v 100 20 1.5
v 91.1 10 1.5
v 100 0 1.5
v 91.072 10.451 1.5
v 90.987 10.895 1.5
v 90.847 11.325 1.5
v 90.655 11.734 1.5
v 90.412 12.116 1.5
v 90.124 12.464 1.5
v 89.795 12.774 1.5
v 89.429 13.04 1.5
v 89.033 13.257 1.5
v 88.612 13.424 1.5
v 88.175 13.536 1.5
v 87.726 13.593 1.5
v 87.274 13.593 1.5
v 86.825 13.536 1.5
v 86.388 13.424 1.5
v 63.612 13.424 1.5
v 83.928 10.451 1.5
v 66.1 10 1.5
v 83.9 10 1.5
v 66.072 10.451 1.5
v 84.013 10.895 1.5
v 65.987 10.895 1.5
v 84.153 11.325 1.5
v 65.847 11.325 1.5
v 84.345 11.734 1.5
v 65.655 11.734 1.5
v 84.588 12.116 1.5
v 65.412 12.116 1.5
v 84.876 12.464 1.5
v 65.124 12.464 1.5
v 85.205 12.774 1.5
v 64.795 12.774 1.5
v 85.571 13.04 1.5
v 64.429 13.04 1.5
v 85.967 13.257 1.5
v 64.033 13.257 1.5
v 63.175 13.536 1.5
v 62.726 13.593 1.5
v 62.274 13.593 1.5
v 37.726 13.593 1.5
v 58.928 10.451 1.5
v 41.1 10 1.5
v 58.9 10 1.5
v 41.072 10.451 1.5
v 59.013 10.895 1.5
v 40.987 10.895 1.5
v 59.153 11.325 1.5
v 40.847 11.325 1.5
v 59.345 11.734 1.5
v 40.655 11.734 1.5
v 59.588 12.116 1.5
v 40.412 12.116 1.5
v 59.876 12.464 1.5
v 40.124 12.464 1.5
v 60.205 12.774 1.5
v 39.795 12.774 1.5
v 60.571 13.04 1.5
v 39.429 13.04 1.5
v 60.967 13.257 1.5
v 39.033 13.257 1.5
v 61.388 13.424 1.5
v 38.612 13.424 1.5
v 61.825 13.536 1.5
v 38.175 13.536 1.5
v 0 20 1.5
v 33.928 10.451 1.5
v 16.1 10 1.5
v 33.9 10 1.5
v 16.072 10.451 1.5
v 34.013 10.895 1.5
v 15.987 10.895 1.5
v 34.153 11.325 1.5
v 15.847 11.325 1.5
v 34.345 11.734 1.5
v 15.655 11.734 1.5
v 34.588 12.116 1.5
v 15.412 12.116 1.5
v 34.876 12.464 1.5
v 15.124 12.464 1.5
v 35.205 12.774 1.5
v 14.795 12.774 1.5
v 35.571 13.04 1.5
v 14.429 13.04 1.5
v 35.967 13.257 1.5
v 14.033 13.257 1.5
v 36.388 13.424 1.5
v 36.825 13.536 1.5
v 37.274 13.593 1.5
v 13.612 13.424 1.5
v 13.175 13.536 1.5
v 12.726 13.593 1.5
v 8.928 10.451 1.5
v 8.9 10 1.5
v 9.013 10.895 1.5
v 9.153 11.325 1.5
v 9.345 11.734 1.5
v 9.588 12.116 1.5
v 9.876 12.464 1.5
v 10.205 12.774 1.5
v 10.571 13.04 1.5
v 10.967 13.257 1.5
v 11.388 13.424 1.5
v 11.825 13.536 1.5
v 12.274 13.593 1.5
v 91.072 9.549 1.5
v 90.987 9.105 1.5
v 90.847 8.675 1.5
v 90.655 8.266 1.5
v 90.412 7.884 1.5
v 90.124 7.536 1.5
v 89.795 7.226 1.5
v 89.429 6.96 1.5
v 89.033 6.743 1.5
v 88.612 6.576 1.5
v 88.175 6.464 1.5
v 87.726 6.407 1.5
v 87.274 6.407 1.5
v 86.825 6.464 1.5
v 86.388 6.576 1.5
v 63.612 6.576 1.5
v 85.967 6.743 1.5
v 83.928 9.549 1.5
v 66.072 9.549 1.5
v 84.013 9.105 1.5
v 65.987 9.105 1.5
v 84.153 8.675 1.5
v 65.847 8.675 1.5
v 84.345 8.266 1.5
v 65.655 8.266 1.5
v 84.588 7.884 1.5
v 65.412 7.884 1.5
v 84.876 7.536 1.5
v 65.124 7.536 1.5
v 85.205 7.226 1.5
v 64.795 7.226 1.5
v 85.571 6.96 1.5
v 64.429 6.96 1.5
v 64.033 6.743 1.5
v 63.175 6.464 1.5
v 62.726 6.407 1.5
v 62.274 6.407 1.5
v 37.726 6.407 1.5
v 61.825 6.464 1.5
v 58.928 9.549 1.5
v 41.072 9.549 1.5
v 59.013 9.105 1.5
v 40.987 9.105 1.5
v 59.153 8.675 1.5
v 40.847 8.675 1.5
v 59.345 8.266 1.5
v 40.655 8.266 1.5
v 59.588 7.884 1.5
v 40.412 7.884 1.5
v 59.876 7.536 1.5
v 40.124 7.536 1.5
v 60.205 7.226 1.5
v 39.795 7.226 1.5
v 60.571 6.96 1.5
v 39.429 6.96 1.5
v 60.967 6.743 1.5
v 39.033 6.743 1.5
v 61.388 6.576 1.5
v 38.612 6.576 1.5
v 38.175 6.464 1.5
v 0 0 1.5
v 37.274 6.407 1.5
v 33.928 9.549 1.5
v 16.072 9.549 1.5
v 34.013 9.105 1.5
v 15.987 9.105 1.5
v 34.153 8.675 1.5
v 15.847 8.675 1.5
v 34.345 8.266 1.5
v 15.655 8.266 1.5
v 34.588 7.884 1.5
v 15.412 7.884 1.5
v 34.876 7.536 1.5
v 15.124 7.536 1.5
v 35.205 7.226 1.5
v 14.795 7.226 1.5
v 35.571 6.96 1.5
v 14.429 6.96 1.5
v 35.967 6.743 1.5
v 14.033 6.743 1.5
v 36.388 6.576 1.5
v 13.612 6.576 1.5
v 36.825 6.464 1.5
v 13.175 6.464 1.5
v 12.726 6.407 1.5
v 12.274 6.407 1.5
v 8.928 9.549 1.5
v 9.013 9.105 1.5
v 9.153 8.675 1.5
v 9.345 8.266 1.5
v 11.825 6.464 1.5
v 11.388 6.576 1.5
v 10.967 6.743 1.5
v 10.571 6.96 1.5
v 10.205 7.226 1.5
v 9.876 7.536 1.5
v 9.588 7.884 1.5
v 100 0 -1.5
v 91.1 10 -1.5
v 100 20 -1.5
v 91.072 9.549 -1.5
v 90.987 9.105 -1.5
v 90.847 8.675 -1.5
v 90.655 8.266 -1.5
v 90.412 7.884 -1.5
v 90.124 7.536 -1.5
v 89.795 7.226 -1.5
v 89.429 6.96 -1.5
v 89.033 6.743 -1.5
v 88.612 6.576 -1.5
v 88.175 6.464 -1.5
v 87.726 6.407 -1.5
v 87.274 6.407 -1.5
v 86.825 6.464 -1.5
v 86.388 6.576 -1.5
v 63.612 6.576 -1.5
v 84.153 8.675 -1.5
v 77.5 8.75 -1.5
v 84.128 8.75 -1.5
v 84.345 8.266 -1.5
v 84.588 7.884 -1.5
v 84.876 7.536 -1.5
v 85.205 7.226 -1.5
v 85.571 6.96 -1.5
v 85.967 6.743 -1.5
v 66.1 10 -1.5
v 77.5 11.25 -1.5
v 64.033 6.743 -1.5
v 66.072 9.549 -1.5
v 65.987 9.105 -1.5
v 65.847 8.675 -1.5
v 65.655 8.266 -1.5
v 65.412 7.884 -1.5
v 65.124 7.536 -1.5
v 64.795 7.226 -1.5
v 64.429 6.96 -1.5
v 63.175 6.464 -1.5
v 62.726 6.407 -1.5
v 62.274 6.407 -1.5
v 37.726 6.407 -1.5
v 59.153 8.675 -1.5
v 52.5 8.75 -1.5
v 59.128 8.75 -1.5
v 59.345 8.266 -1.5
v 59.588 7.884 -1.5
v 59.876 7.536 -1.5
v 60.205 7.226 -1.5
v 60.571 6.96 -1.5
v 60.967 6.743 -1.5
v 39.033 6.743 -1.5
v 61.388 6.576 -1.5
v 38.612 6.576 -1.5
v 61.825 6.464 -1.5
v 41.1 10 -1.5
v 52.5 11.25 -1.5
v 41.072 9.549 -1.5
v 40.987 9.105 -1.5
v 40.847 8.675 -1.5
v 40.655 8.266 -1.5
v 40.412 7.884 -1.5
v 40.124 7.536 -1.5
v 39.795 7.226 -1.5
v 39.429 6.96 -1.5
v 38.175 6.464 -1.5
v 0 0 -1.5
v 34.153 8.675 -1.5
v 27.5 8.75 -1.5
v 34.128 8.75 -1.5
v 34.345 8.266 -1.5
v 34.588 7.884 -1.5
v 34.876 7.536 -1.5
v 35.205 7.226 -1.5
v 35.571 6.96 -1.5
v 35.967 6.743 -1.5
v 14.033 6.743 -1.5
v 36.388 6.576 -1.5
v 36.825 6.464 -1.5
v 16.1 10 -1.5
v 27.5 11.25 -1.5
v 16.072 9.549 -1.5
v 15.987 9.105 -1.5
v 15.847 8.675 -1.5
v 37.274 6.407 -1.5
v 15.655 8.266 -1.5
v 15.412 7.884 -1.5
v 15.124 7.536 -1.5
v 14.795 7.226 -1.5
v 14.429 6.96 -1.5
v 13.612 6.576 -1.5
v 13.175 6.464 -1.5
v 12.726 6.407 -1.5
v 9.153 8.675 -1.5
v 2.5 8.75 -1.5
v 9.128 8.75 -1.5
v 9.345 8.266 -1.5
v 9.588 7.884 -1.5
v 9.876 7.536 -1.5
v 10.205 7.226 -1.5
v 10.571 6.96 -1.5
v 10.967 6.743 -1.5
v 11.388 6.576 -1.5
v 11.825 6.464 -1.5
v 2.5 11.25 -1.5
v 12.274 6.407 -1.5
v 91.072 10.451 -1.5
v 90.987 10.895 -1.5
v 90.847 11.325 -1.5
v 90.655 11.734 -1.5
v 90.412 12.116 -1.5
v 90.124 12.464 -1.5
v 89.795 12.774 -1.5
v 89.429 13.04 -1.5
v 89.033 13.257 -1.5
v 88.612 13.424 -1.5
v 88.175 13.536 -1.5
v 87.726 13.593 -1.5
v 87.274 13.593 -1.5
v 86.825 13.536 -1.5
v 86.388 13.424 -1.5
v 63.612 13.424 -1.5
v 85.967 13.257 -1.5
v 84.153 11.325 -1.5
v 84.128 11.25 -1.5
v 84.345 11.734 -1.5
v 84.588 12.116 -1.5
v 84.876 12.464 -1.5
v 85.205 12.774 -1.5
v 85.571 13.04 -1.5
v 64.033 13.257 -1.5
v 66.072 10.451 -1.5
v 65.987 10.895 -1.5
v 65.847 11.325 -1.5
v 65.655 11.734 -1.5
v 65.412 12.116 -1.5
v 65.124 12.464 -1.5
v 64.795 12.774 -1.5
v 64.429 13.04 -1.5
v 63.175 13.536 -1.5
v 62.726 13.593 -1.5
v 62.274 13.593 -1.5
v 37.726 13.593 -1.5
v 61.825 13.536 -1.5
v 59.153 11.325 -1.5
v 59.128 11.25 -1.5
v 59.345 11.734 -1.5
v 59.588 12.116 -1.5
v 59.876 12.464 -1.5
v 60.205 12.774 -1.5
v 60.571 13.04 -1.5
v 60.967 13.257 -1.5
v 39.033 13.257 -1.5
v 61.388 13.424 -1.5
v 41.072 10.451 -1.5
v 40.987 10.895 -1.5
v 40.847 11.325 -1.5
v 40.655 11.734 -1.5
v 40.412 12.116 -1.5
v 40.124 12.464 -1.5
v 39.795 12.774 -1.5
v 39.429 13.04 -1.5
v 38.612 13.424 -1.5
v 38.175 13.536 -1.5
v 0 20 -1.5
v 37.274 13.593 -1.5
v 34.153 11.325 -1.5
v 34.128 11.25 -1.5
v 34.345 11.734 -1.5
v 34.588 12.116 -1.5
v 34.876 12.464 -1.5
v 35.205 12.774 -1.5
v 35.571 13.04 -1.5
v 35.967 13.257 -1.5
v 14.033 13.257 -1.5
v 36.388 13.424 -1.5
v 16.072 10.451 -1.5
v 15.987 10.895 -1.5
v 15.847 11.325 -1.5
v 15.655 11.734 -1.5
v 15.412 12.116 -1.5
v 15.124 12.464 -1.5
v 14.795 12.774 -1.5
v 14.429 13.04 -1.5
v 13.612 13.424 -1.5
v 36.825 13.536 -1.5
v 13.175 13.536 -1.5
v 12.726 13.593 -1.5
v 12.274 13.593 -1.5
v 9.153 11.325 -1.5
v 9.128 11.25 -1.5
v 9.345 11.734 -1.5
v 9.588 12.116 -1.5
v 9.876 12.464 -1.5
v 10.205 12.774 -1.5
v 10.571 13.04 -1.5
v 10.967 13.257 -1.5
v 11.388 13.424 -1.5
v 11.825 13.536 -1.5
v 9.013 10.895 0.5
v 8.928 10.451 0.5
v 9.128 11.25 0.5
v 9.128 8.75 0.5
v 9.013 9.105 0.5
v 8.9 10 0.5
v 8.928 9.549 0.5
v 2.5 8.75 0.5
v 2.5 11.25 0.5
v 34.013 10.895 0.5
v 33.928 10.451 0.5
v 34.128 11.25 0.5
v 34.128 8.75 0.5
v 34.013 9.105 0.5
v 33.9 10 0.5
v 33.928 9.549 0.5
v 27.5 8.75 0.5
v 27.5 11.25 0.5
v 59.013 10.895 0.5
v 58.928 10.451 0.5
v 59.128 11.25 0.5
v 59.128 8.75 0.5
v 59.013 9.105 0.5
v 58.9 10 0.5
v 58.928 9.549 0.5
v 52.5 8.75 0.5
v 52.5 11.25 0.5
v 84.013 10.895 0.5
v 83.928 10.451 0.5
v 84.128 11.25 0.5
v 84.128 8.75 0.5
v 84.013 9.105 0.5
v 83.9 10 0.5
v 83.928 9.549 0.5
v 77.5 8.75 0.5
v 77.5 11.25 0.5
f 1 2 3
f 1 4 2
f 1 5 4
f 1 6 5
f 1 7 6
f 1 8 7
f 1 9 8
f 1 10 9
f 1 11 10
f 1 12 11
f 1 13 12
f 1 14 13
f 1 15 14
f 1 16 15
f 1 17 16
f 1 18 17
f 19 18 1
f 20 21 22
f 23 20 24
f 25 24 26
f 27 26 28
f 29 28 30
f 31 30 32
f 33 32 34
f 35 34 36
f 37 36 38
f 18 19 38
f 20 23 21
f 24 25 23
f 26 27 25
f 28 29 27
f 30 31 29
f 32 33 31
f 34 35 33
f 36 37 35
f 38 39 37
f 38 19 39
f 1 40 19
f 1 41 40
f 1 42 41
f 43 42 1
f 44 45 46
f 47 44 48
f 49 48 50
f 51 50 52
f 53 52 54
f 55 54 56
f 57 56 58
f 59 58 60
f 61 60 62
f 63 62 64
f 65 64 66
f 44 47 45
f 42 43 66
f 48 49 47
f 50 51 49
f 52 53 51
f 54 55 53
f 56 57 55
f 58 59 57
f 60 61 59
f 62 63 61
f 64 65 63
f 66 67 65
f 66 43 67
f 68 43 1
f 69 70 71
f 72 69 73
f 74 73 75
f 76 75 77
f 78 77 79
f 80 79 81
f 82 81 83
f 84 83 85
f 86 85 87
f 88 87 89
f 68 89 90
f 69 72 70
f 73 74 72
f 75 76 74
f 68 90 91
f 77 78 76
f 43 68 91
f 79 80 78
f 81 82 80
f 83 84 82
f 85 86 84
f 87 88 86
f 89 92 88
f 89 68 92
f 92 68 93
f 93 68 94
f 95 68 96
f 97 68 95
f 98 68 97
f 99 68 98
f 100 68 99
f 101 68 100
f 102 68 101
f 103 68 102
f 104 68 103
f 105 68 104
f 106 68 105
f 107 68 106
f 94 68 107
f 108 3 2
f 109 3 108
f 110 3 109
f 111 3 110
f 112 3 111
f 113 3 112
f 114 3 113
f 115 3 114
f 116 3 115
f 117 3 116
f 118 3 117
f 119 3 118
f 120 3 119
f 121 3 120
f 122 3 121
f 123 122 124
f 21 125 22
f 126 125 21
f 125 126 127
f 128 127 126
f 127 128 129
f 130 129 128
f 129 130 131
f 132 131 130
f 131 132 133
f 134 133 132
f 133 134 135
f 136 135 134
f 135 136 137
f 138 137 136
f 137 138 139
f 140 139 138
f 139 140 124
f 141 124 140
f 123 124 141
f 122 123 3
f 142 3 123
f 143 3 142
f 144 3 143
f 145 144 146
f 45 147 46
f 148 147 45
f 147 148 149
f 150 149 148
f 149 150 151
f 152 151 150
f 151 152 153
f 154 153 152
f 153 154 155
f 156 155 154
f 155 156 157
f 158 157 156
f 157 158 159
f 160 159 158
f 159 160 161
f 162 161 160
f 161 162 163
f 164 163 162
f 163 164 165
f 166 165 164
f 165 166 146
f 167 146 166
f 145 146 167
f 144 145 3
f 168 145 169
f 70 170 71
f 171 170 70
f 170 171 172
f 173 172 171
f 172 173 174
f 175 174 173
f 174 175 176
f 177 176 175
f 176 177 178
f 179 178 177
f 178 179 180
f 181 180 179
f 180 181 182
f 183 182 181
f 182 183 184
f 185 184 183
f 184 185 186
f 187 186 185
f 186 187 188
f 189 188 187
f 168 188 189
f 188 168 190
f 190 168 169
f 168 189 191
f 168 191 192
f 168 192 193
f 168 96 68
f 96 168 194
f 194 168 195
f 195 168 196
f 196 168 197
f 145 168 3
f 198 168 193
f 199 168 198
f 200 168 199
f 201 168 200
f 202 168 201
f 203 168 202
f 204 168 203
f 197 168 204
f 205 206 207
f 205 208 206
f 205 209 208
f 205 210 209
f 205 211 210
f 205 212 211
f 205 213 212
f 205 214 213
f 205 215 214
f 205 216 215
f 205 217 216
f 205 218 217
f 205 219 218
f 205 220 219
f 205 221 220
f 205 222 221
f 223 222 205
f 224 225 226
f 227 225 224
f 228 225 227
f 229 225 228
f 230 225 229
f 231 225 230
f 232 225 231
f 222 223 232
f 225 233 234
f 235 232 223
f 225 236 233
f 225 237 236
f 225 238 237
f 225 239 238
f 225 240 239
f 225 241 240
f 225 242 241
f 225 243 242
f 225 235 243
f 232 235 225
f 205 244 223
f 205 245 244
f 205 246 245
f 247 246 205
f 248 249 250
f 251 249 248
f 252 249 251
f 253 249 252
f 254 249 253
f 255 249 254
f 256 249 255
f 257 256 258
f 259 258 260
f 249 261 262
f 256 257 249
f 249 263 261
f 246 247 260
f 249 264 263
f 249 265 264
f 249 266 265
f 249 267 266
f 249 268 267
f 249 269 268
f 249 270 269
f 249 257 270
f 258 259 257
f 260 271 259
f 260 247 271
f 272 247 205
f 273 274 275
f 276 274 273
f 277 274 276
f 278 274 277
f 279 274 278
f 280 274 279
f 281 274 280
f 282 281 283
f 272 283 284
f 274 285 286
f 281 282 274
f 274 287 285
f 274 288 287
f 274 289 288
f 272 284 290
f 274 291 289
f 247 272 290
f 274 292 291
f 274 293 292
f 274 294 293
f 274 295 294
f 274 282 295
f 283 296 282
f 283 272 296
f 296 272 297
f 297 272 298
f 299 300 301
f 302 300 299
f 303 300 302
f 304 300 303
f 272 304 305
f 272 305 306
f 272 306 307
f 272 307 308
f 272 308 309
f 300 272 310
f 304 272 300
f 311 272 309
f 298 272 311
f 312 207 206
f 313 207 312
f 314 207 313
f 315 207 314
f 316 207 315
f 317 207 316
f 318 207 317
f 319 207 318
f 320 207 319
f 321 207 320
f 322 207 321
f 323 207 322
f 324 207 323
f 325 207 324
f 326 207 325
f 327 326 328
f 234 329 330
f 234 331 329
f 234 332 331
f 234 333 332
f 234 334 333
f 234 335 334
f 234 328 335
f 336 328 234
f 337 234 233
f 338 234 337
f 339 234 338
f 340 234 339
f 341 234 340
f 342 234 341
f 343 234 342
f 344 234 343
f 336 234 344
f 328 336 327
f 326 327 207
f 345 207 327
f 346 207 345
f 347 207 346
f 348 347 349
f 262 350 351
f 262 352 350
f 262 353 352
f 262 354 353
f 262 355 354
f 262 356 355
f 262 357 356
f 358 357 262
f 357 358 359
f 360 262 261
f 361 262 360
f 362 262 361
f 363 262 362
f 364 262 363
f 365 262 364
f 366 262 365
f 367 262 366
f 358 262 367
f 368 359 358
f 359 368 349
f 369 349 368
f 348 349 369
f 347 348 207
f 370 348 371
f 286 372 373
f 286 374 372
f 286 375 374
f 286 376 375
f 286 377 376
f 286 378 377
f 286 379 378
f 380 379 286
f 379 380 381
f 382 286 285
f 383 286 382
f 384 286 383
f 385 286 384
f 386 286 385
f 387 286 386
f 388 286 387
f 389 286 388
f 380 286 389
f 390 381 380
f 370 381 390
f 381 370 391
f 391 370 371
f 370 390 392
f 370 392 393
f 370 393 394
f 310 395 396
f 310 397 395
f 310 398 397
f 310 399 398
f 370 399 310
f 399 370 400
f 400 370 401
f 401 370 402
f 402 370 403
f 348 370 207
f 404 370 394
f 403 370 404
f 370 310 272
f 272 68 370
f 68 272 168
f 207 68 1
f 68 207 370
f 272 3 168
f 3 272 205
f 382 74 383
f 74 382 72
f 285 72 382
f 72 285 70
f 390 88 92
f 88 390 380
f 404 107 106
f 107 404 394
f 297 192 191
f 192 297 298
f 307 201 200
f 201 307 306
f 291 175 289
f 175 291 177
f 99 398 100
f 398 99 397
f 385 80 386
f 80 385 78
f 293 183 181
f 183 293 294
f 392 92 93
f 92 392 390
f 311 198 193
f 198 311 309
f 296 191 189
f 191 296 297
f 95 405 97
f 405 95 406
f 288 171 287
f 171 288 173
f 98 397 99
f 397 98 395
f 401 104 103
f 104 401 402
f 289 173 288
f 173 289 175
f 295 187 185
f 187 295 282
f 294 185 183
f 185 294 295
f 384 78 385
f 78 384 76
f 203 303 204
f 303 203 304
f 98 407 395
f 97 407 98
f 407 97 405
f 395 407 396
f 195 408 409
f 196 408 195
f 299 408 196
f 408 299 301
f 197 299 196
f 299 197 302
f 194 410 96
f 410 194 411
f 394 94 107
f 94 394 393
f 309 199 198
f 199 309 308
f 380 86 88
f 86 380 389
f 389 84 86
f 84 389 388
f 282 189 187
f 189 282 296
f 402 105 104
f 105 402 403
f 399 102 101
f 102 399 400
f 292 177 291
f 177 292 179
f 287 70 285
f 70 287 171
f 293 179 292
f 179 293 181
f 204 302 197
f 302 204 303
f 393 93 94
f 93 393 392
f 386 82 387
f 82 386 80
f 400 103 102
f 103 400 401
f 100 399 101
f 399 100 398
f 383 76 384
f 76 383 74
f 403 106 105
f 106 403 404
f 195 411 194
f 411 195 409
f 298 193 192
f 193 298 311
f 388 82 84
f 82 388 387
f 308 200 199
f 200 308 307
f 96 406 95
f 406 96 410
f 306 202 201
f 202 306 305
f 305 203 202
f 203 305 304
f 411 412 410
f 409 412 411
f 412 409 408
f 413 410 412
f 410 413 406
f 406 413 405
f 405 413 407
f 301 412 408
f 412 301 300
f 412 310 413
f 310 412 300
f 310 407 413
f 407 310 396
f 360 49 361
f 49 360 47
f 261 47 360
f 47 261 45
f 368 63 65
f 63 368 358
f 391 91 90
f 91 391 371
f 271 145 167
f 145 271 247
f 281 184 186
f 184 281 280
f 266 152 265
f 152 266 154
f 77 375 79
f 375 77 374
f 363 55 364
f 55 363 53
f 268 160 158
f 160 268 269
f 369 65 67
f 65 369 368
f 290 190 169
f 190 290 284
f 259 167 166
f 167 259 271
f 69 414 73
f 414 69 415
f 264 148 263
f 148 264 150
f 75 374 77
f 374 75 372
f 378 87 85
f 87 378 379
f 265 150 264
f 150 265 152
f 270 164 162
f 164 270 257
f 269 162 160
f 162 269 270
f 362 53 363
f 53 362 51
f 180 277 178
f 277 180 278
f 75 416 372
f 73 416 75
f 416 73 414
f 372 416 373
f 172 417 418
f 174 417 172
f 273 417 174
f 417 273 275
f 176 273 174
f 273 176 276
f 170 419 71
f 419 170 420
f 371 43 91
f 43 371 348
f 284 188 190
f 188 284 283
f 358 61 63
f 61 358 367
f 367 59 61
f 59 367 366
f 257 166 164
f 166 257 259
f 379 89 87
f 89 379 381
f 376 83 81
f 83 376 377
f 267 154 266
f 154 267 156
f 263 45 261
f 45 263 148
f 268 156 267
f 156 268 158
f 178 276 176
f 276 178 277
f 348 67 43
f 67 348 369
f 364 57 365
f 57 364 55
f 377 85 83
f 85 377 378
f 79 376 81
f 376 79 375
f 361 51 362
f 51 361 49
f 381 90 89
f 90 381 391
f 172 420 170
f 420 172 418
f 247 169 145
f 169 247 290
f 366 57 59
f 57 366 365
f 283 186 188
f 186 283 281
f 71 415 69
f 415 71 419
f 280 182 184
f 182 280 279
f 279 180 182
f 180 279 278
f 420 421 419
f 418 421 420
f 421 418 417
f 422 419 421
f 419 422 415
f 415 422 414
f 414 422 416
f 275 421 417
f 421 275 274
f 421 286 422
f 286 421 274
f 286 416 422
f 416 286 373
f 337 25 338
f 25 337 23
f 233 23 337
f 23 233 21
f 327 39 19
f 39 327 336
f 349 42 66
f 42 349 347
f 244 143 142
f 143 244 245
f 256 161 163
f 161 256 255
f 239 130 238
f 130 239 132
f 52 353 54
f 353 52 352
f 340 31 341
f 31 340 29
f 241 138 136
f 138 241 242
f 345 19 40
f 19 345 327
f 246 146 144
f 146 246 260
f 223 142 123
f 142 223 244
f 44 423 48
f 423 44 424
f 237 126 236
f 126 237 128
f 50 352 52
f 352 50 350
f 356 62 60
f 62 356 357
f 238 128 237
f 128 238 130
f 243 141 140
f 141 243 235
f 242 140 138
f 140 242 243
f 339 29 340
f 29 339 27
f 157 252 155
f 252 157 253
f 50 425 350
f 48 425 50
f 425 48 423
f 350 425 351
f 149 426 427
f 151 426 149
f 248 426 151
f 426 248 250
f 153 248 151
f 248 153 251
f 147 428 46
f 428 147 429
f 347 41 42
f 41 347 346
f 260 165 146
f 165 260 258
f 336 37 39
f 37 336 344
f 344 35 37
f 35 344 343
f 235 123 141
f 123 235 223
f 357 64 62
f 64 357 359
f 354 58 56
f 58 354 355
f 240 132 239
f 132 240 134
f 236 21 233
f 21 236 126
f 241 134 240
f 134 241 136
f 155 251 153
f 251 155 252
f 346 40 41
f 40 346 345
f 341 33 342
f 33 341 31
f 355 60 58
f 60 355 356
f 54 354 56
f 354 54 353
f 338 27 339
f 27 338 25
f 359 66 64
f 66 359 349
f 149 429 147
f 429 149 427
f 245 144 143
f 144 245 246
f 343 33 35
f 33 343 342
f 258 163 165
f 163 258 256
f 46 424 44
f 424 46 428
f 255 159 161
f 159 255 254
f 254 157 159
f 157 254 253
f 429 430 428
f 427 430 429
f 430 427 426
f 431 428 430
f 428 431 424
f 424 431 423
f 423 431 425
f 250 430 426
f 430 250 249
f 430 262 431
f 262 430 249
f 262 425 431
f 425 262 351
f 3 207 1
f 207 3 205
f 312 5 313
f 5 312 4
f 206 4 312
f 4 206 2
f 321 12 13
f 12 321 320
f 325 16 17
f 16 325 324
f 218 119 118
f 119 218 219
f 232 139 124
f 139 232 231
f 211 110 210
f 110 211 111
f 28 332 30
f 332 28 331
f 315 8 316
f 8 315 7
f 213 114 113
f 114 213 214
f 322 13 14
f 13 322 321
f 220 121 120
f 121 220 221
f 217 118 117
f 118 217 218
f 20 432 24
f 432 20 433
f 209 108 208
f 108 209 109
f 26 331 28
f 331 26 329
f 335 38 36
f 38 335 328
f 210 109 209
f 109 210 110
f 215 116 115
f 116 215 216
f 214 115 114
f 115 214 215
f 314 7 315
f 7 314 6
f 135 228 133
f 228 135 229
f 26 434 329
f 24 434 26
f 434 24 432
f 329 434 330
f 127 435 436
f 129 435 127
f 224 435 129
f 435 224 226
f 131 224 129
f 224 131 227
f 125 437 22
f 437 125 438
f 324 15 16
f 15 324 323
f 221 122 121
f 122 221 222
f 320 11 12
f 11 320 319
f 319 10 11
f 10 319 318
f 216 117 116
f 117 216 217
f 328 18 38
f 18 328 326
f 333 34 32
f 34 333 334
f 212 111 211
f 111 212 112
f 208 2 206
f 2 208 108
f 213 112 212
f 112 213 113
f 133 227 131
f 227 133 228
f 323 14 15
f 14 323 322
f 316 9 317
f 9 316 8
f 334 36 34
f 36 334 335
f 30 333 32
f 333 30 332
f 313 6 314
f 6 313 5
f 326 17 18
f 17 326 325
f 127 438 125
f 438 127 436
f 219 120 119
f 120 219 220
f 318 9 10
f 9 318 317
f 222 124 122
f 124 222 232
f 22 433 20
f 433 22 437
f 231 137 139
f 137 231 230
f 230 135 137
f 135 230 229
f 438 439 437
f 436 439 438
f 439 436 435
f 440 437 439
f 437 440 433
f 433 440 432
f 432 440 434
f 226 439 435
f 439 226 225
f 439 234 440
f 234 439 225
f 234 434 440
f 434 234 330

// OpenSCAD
$fn = 50;

module pot(length, width, height, notch_angles) {
    difference() {
        hole_radius = 3.6;
        notch_length = 10;
        notch_width = 2.5;
        notch_height = 2;
        
        // surface
        cube([width, length, height], true);
        
        // hole
        cylinder(h = 7, r = hole_radius, center = true);

        // notches
        for (notch_angle = notch_angles) {
            rotate([0, 0, notch_angle]) {
                translate([notch_width / -2, 0, -height / 2]) {
                    cube([notch_width, notch_length, notch_height]);
                }
            }
        }
    }
}

rows = 1;
columns = 4;

pot_length = 20;
pot_width = 25;
panel_thickness = 3;

translate([pot_width / 2, pot_length / 2, 0]) {
    for (i = [0:columns - 1]) {
        for (j = [0:rows - 1]) {
            translate([pot_width * i, pot_length * j, 0])
                pot(pot_length, pot_width, panel_thickness, [90 + (90 * j)]);
        }
    }
}
